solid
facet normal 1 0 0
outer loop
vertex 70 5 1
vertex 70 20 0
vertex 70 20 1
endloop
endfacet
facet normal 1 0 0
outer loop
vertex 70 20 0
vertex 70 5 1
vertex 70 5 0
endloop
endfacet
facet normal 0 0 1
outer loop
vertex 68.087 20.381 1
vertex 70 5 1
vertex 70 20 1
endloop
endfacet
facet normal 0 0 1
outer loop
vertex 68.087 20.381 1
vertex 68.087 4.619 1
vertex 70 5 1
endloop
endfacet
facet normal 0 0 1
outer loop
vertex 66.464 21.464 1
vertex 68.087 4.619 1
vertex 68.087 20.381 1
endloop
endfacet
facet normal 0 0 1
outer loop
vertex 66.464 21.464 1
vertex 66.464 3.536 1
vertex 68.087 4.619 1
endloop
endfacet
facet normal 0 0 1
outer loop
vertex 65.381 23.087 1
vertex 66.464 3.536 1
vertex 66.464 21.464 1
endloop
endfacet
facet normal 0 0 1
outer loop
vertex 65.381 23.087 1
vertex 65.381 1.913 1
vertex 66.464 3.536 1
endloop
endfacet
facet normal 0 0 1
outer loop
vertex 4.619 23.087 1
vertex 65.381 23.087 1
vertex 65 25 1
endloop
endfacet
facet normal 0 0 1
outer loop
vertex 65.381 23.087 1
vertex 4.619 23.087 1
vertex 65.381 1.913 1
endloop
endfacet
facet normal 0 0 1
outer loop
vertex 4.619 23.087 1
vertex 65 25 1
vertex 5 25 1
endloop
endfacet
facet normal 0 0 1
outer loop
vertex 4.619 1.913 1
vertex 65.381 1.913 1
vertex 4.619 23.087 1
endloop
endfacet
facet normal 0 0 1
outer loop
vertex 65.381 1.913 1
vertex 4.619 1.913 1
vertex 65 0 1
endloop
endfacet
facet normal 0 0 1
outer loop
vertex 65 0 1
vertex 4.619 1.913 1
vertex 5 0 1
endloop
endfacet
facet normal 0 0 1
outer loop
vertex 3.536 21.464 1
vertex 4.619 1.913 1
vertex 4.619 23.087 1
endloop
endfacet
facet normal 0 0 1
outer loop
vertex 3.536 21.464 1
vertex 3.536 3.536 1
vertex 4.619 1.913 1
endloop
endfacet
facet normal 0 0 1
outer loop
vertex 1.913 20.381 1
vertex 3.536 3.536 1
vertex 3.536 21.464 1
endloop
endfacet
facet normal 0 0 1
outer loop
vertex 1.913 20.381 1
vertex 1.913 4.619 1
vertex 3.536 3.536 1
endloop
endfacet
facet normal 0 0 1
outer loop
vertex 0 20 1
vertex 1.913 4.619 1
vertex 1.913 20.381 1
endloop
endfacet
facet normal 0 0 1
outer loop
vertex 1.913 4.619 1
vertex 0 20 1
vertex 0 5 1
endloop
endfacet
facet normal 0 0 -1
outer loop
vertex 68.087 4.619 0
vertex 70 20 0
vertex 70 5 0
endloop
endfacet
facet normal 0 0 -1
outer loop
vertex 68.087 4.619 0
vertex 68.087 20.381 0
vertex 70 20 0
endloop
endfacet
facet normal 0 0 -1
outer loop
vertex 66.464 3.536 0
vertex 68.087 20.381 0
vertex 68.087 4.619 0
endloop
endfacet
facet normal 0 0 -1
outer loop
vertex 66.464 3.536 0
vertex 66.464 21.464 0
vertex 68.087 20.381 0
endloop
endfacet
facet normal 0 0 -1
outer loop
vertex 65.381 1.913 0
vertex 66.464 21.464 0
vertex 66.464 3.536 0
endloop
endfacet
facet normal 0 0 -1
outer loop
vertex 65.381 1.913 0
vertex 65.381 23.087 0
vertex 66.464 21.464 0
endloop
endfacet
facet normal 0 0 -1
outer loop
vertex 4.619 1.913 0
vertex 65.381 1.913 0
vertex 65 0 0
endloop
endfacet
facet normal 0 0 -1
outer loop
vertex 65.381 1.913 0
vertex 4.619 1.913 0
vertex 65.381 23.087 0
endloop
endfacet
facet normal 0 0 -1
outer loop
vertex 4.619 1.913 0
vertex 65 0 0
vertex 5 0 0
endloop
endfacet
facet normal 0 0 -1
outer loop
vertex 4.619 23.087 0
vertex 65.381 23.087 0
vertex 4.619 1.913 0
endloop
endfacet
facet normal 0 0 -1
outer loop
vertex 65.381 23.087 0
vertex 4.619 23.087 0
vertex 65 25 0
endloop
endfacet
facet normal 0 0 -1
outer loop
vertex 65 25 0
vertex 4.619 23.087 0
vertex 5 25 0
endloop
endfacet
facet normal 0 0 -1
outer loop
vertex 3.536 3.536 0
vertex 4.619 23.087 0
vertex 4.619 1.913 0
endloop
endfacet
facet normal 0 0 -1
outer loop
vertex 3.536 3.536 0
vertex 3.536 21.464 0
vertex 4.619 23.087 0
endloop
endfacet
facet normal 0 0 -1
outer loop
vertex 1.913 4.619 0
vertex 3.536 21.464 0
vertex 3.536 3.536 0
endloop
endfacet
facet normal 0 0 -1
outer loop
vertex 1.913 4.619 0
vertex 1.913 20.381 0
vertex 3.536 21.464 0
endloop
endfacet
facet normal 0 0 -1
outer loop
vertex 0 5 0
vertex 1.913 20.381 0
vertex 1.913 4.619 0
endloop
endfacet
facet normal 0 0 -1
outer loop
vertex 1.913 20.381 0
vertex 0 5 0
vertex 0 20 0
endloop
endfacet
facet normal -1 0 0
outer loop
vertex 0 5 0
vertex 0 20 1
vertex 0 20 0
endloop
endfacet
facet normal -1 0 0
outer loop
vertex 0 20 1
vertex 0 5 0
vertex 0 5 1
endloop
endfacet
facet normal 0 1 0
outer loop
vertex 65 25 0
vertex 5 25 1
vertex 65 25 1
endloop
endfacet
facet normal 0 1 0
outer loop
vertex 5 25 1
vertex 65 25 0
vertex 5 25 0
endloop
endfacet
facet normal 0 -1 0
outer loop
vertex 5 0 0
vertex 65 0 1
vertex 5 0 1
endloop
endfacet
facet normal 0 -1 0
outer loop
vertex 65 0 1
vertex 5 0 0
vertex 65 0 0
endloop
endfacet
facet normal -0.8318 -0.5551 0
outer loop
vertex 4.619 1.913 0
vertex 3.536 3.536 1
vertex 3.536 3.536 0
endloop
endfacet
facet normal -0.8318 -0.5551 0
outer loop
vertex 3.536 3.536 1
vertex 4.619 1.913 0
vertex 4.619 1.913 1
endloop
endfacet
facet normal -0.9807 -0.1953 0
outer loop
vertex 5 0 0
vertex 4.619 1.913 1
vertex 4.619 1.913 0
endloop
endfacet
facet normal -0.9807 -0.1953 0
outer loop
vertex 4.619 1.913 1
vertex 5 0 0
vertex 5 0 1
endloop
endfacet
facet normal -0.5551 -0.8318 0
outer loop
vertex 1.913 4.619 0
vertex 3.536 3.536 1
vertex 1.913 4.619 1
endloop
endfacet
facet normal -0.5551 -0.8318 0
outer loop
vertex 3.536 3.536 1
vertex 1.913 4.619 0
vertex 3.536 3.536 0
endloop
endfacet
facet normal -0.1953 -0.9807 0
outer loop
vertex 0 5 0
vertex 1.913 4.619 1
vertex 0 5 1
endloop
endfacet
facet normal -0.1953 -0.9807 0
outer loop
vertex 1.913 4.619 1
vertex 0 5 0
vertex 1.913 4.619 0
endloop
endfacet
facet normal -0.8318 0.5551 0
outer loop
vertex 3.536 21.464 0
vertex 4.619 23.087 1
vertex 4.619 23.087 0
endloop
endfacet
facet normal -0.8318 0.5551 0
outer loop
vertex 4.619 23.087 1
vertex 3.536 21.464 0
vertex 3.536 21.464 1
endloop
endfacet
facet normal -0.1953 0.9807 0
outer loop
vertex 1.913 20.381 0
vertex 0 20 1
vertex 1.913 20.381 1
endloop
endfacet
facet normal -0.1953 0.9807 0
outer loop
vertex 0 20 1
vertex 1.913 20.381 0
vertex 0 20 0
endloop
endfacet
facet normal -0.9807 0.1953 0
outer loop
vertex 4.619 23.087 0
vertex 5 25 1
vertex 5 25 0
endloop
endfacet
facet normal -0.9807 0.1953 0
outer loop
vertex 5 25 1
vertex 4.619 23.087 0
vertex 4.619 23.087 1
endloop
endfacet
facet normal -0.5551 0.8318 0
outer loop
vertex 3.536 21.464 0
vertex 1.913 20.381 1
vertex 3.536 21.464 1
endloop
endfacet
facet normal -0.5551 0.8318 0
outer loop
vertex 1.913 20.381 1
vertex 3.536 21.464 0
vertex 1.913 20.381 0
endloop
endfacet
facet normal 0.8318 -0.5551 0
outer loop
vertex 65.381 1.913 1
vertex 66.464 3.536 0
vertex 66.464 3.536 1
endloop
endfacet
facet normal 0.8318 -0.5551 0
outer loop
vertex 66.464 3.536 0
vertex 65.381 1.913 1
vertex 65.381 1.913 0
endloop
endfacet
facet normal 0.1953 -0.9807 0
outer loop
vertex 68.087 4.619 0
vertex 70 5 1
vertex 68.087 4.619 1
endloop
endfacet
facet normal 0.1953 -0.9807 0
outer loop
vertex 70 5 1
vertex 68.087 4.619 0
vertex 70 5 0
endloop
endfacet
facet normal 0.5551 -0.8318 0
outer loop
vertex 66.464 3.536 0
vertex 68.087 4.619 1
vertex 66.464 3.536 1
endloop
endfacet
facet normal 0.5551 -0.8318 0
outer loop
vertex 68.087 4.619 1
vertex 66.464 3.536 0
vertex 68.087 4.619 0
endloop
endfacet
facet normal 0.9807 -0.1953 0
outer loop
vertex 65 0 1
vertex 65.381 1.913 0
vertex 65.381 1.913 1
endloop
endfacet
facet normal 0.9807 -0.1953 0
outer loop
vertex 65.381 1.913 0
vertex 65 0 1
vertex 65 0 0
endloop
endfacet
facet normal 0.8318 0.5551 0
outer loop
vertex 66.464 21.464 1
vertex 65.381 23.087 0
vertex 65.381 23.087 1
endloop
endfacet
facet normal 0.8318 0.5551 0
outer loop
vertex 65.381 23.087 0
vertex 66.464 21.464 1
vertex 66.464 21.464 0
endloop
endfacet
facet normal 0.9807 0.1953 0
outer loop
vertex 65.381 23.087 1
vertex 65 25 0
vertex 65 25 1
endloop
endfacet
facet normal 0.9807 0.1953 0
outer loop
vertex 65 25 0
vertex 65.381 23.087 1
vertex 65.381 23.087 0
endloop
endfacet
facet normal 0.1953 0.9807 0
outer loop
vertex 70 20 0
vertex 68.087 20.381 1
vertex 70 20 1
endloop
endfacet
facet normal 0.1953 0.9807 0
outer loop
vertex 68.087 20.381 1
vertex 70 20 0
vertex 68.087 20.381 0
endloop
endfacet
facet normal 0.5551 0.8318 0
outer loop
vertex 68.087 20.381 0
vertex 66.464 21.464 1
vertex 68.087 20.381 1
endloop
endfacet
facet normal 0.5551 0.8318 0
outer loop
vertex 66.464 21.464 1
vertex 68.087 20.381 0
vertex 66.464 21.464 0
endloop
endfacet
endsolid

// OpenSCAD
width = 70;
height = 25;

difference() {
    cube([width, height, 1]);
    translate([0,0,-1])
        cylinder(r = 5, h = 3);
    translate([0,height,-1])
        cylinder(r = 5, h = 3);
    translate([width,0,-1])
        cylinder(r = 5, h = 3);
    translate([width,height,-1])
        cylinder(r = 5, h = 3);
}
    
